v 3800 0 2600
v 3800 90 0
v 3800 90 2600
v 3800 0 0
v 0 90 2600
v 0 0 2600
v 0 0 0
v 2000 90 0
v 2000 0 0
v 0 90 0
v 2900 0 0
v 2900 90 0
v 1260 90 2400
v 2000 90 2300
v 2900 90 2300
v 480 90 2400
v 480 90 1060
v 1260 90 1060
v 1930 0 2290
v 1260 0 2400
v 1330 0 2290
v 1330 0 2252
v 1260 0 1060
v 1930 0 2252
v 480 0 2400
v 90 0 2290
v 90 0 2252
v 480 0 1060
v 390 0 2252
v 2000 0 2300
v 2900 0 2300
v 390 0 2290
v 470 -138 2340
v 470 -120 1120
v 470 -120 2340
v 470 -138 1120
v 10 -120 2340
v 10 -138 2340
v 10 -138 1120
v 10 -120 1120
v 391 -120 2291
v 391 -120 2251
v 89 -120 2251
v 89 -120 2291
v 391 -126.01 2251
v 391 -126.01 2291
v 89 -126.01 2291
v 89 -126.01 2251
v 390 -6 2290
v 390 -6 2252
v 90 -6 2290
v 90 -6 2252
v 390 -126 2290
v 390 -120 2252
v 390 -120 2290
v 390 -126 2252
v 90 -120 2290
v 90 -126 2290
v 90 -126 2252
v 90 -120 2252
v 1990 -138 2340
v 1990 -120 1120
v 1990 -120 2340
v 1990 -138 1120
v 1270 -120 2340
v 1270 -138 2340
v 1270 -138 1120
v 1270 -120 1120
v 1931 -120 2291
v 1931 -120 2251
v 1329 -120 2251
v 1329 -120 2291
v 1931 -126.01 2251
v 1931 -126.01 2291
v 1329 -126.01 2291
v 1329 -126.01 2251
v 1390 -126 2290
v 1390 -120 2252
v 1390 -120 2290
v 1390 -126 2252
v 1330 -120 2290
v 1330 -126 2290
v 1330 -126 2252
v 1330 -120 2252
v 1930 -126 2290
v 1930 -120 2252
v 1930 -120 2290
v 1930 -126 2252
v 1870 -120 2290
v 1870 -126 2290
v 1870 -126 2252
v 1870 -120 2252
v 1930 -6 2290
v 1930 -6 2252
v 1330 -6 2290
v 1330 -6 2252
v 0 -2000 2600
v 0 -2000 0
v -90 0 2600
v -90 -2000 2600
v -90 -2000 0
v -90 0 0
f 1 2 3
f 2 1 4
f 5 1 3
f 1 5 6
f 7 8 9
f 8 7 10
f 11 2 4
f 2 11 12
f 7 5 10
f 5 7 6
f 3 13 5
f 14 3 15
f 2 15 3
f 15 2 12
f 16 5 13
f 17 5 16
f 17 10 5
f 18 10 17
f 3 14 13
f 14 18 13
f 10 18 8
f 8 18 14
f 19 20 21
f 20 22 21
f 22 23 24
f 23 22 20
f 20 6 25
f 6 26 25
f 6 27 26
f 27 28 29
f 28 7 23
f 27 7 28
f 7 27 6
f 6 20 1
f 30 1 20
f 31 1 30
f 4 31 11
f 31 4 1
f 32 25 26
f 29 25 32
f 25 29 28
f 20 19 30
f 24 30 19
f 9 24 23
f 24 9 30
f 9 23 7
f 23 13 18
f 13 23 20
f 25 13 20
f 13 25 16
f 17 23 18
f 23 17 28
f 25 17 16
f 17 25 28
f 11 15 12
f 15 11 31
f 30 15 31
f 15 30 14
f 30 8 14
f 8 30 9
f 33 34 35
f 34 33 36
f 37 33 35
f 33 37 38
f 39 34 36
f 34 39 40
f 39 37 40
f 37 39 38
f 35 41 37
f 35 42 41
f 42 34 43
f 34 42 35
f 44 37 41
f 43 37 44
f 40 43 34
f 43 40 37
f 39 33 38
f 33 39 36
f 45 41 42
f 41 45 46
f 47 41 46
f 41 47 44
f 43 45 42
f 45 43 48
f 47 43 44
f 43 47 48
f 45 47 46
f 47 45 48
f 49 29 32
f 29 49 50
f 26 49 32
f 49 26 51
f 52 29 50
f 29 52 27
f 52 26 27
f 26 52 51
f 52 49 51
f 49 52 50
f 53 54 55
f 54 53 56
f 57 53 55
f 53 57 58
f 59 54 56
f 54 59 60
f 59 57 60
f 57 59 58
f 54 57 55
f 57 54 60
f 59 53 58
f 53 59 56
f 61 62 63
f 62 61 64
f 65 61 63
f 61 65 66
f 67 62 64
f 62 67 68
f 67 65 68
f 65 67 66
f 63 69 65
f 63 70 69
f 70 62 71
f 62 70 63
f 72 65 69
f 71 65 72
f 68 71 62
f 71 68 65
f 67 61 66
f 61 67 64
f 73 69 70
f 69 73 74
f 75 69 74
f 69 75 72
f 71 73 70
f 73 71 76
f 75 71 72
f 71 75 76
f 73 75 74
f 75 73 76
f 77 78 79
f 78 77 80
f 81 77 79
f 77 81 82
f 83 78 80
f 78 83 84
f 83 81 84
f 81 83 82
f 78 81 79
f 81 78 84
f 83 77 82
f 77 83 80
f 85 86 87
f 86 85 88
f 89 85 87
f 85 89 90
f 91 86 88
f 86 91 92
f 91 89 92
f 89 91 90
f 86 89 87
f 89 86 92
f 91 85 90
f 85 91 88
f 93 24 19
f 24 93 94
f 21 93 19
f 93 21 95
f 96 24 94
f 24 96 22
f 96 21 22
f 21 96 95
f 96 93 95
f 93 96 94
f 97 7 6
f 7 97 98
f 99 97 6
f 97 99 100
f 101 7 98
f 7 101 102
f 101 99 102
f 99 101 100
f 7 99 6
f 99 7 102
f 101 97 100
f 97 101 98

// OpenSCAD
// file: ../components/french_cleat_zbar.scad
//
// Simplified visual envelope for a metal French-cleat / Z-bar profile.
//
// The exact Ropro extrusion cross-section and screw-hole pattern are not
// reproduced here. The known product envelope used by this model is:
// - profile height: 38 mm
// - assembled wall distance: 6 mm
//

module french_cleat_zbar_envelope(
    length,
    height = 38,
    depth = 6
) {
    cube([length, depth, height]);
}
// file: ../components/skadis_panel.scad
//
// Generic IKEA SKADIS-style 36 x 56 cm pegboard component.
//
// Local coordinate system:
// - mounting surface is Y = 0
// - board projects towards negative Y (garage interior)
// - X is left/right
// - Z is bottom/top
//
// The nominal outer dimensions and the original mounting rail length come
// from IKEA. The slot geometry is modelled as the commonly documented SKADIS
// dual 40 mm grid with a 20 mm stagger. It is intended for layout/detail
// visualization rather than manufacturing an IKEA replacement panel.
//

module _skadis_rounded_rect_2d(width, height, radius) {
    translate([radius, radius])
        offset(r = radius)
            square([
                width - 2 * radius,
                height - 2 * radius
            ]);
}

module _skadis_slot_2d(width = 5, height = 15) {
    straight = max(0, height - width);

    hull() {
        translate([0, -straight / 2])
            circle(d = width, $fn = 20);

        translate([0, straight / 2])
            circle(d = width, $fn = 20);
    }
}

module _skadis_face_2d(
    width,
    height,
    corner_radius,
    slot_width,
    slot_height,
    grid_pitch,
    grid_offset,
    slots = true
) {
    difference() {
        _skadis_rounded_rect_2d(
            width = width,
            height = height,
            radius = corner_radius
        );

        if (slots) {
            // Grid A: 20,20 relative to the outer edge; 40 mm pitch.
            for (
                x = [grid_offset : grid_pitch : width - grid_offset],
                z = [grid_offset : grid_pitch : height - grid_offset]
            )
                translate([x, z])
                    _skadis_slot_2d(
                        width = slot_width,
                        height = slot_height
                    );

            // Grid B: same grid shifted 20 mm in both directions.
            for (
                x = [2 * grid_offset : grid_pitch : width - 2 * grid_offset],
                z = [2 * grid_offset : grid_pitch : height - 2 * grid_offset]
            )
                translate([x, z])
                    _skadis_slot_2d(
                        width = slot_width,
                        height = slot_height
                    );
        }
    }
}

module skadis_board(
    width = 360,
    height = 560,
    thickness = 5,
    corner_radius = 9,
    slot_width = 5,
    slot_height = 15,
    grid_pitch = 40,
    grid_offset = 20,
    slots = true
) {
    // 2D X/Z face extruded towards negative Y.
    rotate([90, 0, 0])
        linear_extrude(height = thickness, convexity = 10)
            _skadis_face_2d(
                width = width,
                height = height,
                corner_radius = corner_radius,
                slot_width = slot_width,
                slot_height = slot_height,
                grid_pitch = grid_pitch,
                grid_offset = grid_offset,
                slots = slots
            );
}

module skadis_mounting_hardware(
    width = 360,
    height = 560,
    rail_length = 200,
    mount_gap = 15,
    rail_height = 20,
    rail_depth = 4,
    lower_spacer_diameter = 14,
    lower_spacer_depth = 15,
    mount_z_inset = 20
) {
    mount_x0 = (width - rail_length) / 2;

    // Simplified original upper wall rail. It is deliberately only an
    // envelope; the exact stamped-steel profile is not required for layout.
    color([0.62, 0.64, 0.66])
        translate([
            mount_x0,
            -rail_depth,
            height - mount_z_inset - rail_height / 2
        ])
            cube([
                rail_length,
                rail_depth,
                rail_height
            ]);

    // Lower spacers keep the panel parallel with the mounting surface.
    for (x = [mount_x0, mount_x0 + rail_length])
        color([0.45, 0.47, 0.49])
            translate([x, 0, mount_z_inset])
                rotate([90, 0, 0])
                    cylinder(
                        h = lower_spacer_depth,
                        d = lower_spacer_diameter,
                        $fn = 28
                    );
}

module skadis_mounting_points(
    width = 360,
    height = 560,
    thickness = 5,
    mount_gap = 15,
    rail_length = 200,
    z_inset = 20,
    head_diameter = 12,
    head_depth = 2
) {
    x_left  = (width - rail_length) / 2;
    x_right = x_left + rail_length;

    // IKEA uses four visible board fasteners: two into the upper rail and
    // two into the lower spacers. They pass through the pegboard slots; these
    // raised discs make those mounting points visible in the garage model.
    for (
        x = [x_left, x_right],
        z = [z_inset, height - z_inset]
    )
        color([0.76, 0.76, 0.74])
            translate([
                x,
                -mount_gap - thickness,
                z
            ])
                rotate([90, 0, 0])
                    cylinder(
                        h = head_depth,
                        d = head_diameter,
                        $fn = 32
                    );
}

module skadis_panel(
    width = 360,
    height = 560,
    thickness = 5,
    mount_gap = 15,
    corner_radius = 9,
    slot_width = 5,
    slot_height = 15,
    grid_pitch = 40,
    grid_offset = 20,
    rail_length = 200,
    mount_point_z_inset = 20,
    mount_head_diameter = 12,
    mount_head_depth = 2,
    slot_pattern = true,
    mounting_points = true,
    mounting_hardware = false,
    board_color = [0.035, 0.035, 0.035]
) {
    if (mounting_hardware)
        skadis_mounting_hardware(
            width = width,
            height = height,
            rail_length = rail_length,
            mount_gap = mount_gap,
            mount_z_inset = mount_point_z_inset
        );

    color(board_color)
        translate([0, -mount_gap, 0])
            skadis_board(
                width = width,
                height = height,
                thickness = thickness,
                corner_radius = corner_radius,
                slot_width = slot_width,
                slot_height = slot_height,
                grid_pitch = grid_pitch,
                grid_offset = grid_offset,
                slots = slot_pattern
            );

    if (mounting_points)
        skadis_mounting_points(
            width = width,
            height = height,
            thickness = thickness,
            mount_gap = mount_gap,
            rail_length = rail_length,
            z_inset = mount_point_z_inset,
            head_diameter = mount_head_diameter,
            head_depth = mount_head_depth
        );
}
// file: ../components/backing_panel.scad
//
// Generic backing panel with optional routed recesses in the back face.
//
// Local coordinate system:
// - X: left to right
// - Y: back face at Y = 0, front projects towards negative Y
// - Z: bottom to top
//
// recesses: [x, z, width, height, depth]
//

module backing_panel(
    width,
    height,
    thickness,
    recesses = []
) {
    difference() {
        translate([0, -thickness, 0])
            cube([width, thickness, height]);

        for (r = recesses) {
            recess_x      = r[0];
            recess_z      = r[1];
            recess_width  = r[2];
            recess_height = r[3];
            recess_depth  = r[4];

            // Pocket is routed from the back face into the panel.
            translate([
                recess_x,
                -recess_depth - 0.01,
                recess_z
            ])
                cube([
                    recess_width,
                    recess_depth + 0.02,
                    recess_height
                ]);
        }
    }
}
// file: ../components/floor_slab.scad
//
// Generic floor slab.
// Top surface is at Z = 0.
//

module floor_slab(width, depth, thickness) {
    translate([0, -depth, -thickness])
        cube([width, depth, thickness]);
}
// file: ../components/workbench.scad
//
// Generic workbench component
//

module workbench(
    width,
    depth,
    height,
    top_thickness = 40,
    leg_size = 70,
    leg_inset = 60
) {
    top_z = height - top_thickness;
    leg_height = top_z;

    // Worktop
    translate([0, -depth, top_z])
        cube([width, depth, top_thickness]);

    // Rear left leg
    translate([
        leg_inset,
        -leg_size - leg_inset,
        0
    ])
        cube([leg_size, leg_size, leg_height]);

    // Rear right leg
    translate([
        width - leg_inset - leg_size,
        -leg_size - leg_inset,
        0
    ])
        cube([leg_size, leg_size, leg_height]);

    // Front left leg
    translate([
        leg_inset,
        -depth + leg_inset,
        0
    ])
        cube([leg_size, leg_size, leg_height]);

    // Front right leg
    translate([
        width - leg_inset - leg_size,
        -depth + leg_inset,
        0
    ])
        cube([leg_size, leg_size, leg_height]);
}
// file: ../components/opening_frame.scad
//
// Generic rectangular three/four-sided opening frame.
// The opening starts at [0, 0, 0].
//

module opening_frame(
    opening_width,
    opening_height,
    border,
    depth,
    include_bottom = true
) {
    // Left
    translate([-border, 0, -border])
        cube([
            border,
            depth,
            opening_height + 2 * border
        ]);

    // Right
    translate([opening_width, 0, -border])
        cube([
            border,
            depth,
            opening_height + 2 * border
        ]);

    // Top
    translate([0, 0, opening_height])
        cube([
            opening_width,
            depth,
            border
        ]);

    if (include_bottom)
        translate([0, 0, -border])
            cube([
                opening_width,
                depth,
                border
            ]);
}
// file: ../project_components/garage_floor.scad
//
// Project component: current garage floor area.
//

include <../components/floor_slab.scad>

module garage_floor(width, depth, thickness) {
    floor_slab(
        width     = width,
        depth     = depth,
        thickness = thickness
    );
}
// file: ../project_components/garage_workbench.scad
//
// Project component: garage workbench derived from the generic workbench.
//

include <../components/workbench.scad>

module garage_workbench(
    x,
    width,
    depth,
    height,
    top_thickness,
    leg_size,
    leg_inset
) {
    translate([x, 0, 0])
        workbench(
            width         = width,
            depth         = depth,
            height        = height,
            top_thickness = top_thickness,
            leg_size      = leg_size,
            leg_inset     = leg_inset
        );
}
// file: ../project_components/rear_door.scad
//
// Project component: rear door frame.
// Frame is placed on the exterior side of the concrete wall.
//

include <../components/opening_frame.scad>

module rear_door_frame(
    x,
    wall_thickness,
    opening_width,
    opening_height,
    frame_border,
    frame_depth
) {
    translate([x, wall_thickness, 0])
        opening_frame(
            opening_width  = opening_width,
            opening_height = opening_height,
            border         = frame_border,
            depth          = frame_depth,
            include_bottom = false
        );
}
// file: ../project_components/rear_window.scad
//
// Project component: rear window frame and interior sill.
//

include <../components/opening_frame.scad>

module rear_window_frame(
    x,
    z,
    wall_thickness,
    opening_width,
    opening_height,
    frame_border,
    frame_depth
) {
    translate([x, wall_thickness, z])
        opening_frame(
            opening_width  = opening_width,
            opening_height = opening_height,
            border         = frame_border,
            depth          = frame_depth,
            include_bottom = true
        );
}

module rear_window_sill(
    x,
    z,
    opening_width,
    thickness,
    depth,
    side_extra
) {
    // Sill projects into the garage (negative Y).
    translate([
        x - side_extra,
        -depth,
        z - thickness
    ])
        cube([
            opening_width + 2 * side_extra,
            depth,
            thickness
        ]);
}
// file: ../project_components/left_wall.scad
//
// Project component: left garage wall.
// Coordinate system follows the rear-wall model:
// - rear inside face is Y = 0
// - garage extends towards negative Y
// - left inside face is X = 0
//

module left_wall(
    depth,
    height,
    thickness
) {
    translate([-thickness, -depth, 0])
        cube([
            thickness,
            depth,
            height
        ]);
}
// file: ../project_components/rear_wall.scad
//
// Project component: garage rear wall with window and door openings.
// Garage interior is on negative Y.
// Exterior wall side is positive Y.
//

module rear_wall(
    width,
    height,
    thickness,
    window_x,
    window_z,
    window_width,
    window_height,
    door_x,
    door_width,
    door_height
) {
    difference() {
        cube([width, thickness, height]);

        // Window opening
        translate([window_x, -1, window_z])
            cube([
                window_width,
                thickness + 2,
                window_height
            ]);

        // Door opening
        translate([door_x, -1, 0])
            cube([
                door_width,
                thickness + 2,
                door_height
            ]);
    }
}
// file: ../assemblies/garage_rear.scad
//
// Assembly: current rear section of the garage.
// Expects config.scad to be included by the calling file.
//

include <../project_components/rear_wall.scad>
include <../project_components/left_wall.scad>
include <../project_components/rear_window.scad>
include <../project_components/rear_door.scad>
include <../project_components/garage_workbench.scad>
include <../project_components/garage_floor.scad>
include <../project_components/rear_tool_panels.scad>

module garage_rear_scene(
    rear_wall_visible     = true,
    left_wall_visible     = true,
    window_frame_visible  = true,
    door_frame_visible    = true,
    window_sill_visible   = true,
    workbench_visible     = true,
    floor_visible         = true,
    tool_backing_visible  = true,
    skadis_visible        = true,
    tool_mounts_visible   = true,
    skadis_slots_visible  = true,
    skadis_mount_points_visible = true,
    skadis_mount_hardware_visible = false,
    tool_panels_explode   = 0
) {
    if (floor_visible)
        color([0.68, 0.68, 0.68])
            garage_floor(
                width     = wall_width,
                depth     = floor_depth,
                thickness = floor_thickness
            );

    if (rear_wall_visible)
        color([0.82, 0.82, 0.80])
            rear_wall(
                width         = wall_width,
                height        = wall_height,
                thickness     = wall_thickness,
                window_x      = window_left_offset,
                window_z      = window_bottom,
                window_width  = window_width,
                window_height = window_height,
                door_x        = door_left,
                door_width    = door_width,
                door_height   = door_height
            );

    if (left_wall_visible)
        color([0.82, 0.82, 0.80])
            left_wall(
                depth     = left_wall_depth,
                height    = wall_height,
                thickness = wall_thickness
            );

    if (window_frame_visible)
        color([0.25, 0.25, 0.25])
            rear_window_frame(
                x              = window_left_offset,
                z              = window_bottom,
                wall_thickness = wall_thickness,
                opening_width  = window_width,
                opening_height = window_height,
                frame_border   = frame_border,
                frame_depth    = frame_depth
            );

    if (door_frame_visible)
        color([0.25, 0.25, 0.25])
            rear_door_frame(
                x              = door_left,
                wall_thickness = wall_thickness,
                opening_width  = door_width,
                opening_height = door_height,
                frame_border   = frame_border,
                frame_depth    = frame_depth
            );

    if (window_sill_visible)
        color([0.88, 0.88, 0.86])
            rear_window_sill(
                x             = window_left_offset,
                z             = window_bottom,
                opening_width = window_width,
                thickness     = window_sill_thickness,
                depth         = window_sill_depth,
                side_extra    = window_sill_side_extra
            );

    if (workbench_visible)
        color([0.58, 0.39, 0.22])
            garage_workbench(
                x             = workbench_x,
                width         = workbench_width,
                depth         = workbench_depth,
                height        = workbench_height,
                top_thickness = workbench_top_thickness,
                leg_size      = workbench_leg_size,
                leg_inset     = workbench_leg_inset
            );

    if (tool_backing_visible || skadis_visible || tool_mounts_visible)
        rear_tool_panels(
            backing_visible = tool_backing_visible,
            skadis_visible  = skadis_visible,
            mounting_visible = tool_mounts_visible,
            slot_pattern    = skadis_slots_visible,
            skadis_mount_points_visible = skadis_mount_points_visible,
            skadis_mount_hardware_visible = skadis_mount_hardware_visible,
            explode         = tool_panels_explode
        );

}
// file: ../config.scad
//
// Garage layout - configuration
// Units: millimetres
//

$fn = 48;


/* [View] */

show_rear_wall           = true;
show_left_wall           = true;
show_window_frame        = true;
show_door_frame          = true;
show_window_sill         = true;
show_workbench           = true;
show_floor               = true;
show_tool_backing_panels = true;
show_skadis_panels       = true;
show_tool_panel_mounts   = true;
show_skadis_slot_pattern = true;
show_skadis_mount_points = true;
show_skadis_mount_hardware = false;

// Move multiplex + SKADIS towards the garage to inspect the concealed mount.
tool_panel_explode = 0; // [0:5:150]


/* [Garage walls] */

wall_width     = 3800;
wall_height    = 2600;

// Concrete / structural inner shell only.
// Additional exterior wall layers can be added later.
wall_thickness = 90;

// Temporary left-wall depth follows the currently modelled floor depth.
// This will become the measured garage depth later.
left_wall_depth = 2000;


/* [Window opening] */

// Inside view: measured from the left side of the rear wall.
window_left_offset = 480;
window_width       = 780;
window_height      = 1340;
window_top_offset  = 200;

window_bottom = wall_height - window_top_offset - window_height;


/* [Window sill] */

// Projection into the garage from the inside face of the wall.
window_sill_thickness  = 20;
window_sill_depth      = 20;
window_sill_side_extra = 20;


/* [Door opening] */

// Horizontal distance between the right side of the window opening
// and the left side of the door opening.
window_to_door = 740;

// Width is provisional until measured.
door_width  = 900;
door_height = 2300;

door_left = window_left_offset + window_width + window_to_door;


/* [Exterior frames] */

// Simplified visualization. Both frames sit on the exterior side
// of the 90 mm concrete wall.
frame_border = 50;
frame_depth  = 60;


/* [Workbench] */

workbench_width  = 1500;
workbench_depth  = 750;
workbench_height = 990;

workbench_top_thickness = 40;
workbench_leg_size      = 70;
workbench_leg_inset     = 60;

// Inside view: workbench starts at the left end of the rear wall.
workbench_x = 0;


/* [Tool panel backing] */

// Use the 1220 mm sheet dimension directly. The backing panels are centred
// vertically on the window opening instead of being made as tall as the window.
tool_panel_height = 1220;
tool_panel_bottom = window_bottom + (window_height - tool_panel_height) / 2;
tool_panel_top    = tool_panel_bottom + tool_panel_height;

tool_panel_thickness = 18;

// Left wall strip is 480 mm; keep 10 mm free on each side.
left_tool_panel_width = 460;
left_tool_panel_x = (window_left_offset - left_tool_panel_width) / 2;

// Right wall strip between window and door is 740 mm; keep 10 mm each side.
right_tool_panel_width = 720;
right_tool_panel_x =
    window_left_offset + window_width
    + (window_to_door - right_tool_panel_width) / 2;


/* [SKADIS] */

skadis_width  = 360;
skadis_height = 560;
skadis_thickness = 5;

// Approximate stand-off created by the original IKEA wall rail/spacers.
skadis_mount_gap = 15;

// Geometry used for the recognisable SKADIS pattern.
skadis_corner_radius = 9;
skadis_slot_width    = 5;
skadis_slot_height   = 15;
skadis_grid_pitch    = 40;
skadis_grid_offset   = 20;

// The 36 cm board uses the supplied 20 cm wall rail. The four visible board
// fasteners are modelled at the corresponding left/right positions.
skadis_rail_length = 200;
skadis_mount_point_z_inset = 20;
skadis_mount_head_diameter = 12;
skadis_mount_head_depth = 2;


/* [Tool panel mounting - Ropro] */

// Ropro Heavy Duty French Cleat / Z-bar known dimensions.
cleat_profile_height = 38;
cleat_wall_distance  = 6;

// Route the full wall-rail envelope into the back of the 18 mm multiplex.
// This leaves 12 mm of multiplex below the recess and must be considered
// when selecting screws for the panel-side counter profile.
cleat_recess_depth = 6;
cleat_recess_clearance = 1;

// Position rail near the upper edge, safely above the panel centre of gravity.
cleat_top_inset = 50;

// Left panel: Ropro Heavy Duty 30 cm set (300 + 300 mm).
left_cleat_wall_length  = 300;
left_cleat_panel_length = 300;

// Right panel: Ropro Heavy Duty 60+6 cm set:
// 600 mm wall rail + two 60 mm panel-side counter profiles.
right_cleat_wall_length = 600;
right_cleat_panel_piece_length = 60;


/* [Floor] */

// Temporary depth until the complete garage depth is measured.
floor_depth     = 2000;
floor_thickness = 100;
// main file
// Render entry point: inspect routed recesses and concealed Ropro mount

include <../config.scad>
include <../assemblies/garage_rear.scad>

$vpr = [72, 0, 150];
$vpt = [1050, -80, 1750];
$vpd = 3600;

garage_rear_scene(
    rear_wall_visible = true,
    left_wall_visible     = true,
    window_frame_visible  = false,
    door_frame_visible    = false,
    window_sill_visible   = false,
    workbench_visible     = false,
    floor_visible         = false,
    tool_backing_visible  = true,
    skadis_visible        = false,
    tool_mounts_visible   = true,
    skadis_slots_visible  = false,
    tool_panels_explode   = 120
);
